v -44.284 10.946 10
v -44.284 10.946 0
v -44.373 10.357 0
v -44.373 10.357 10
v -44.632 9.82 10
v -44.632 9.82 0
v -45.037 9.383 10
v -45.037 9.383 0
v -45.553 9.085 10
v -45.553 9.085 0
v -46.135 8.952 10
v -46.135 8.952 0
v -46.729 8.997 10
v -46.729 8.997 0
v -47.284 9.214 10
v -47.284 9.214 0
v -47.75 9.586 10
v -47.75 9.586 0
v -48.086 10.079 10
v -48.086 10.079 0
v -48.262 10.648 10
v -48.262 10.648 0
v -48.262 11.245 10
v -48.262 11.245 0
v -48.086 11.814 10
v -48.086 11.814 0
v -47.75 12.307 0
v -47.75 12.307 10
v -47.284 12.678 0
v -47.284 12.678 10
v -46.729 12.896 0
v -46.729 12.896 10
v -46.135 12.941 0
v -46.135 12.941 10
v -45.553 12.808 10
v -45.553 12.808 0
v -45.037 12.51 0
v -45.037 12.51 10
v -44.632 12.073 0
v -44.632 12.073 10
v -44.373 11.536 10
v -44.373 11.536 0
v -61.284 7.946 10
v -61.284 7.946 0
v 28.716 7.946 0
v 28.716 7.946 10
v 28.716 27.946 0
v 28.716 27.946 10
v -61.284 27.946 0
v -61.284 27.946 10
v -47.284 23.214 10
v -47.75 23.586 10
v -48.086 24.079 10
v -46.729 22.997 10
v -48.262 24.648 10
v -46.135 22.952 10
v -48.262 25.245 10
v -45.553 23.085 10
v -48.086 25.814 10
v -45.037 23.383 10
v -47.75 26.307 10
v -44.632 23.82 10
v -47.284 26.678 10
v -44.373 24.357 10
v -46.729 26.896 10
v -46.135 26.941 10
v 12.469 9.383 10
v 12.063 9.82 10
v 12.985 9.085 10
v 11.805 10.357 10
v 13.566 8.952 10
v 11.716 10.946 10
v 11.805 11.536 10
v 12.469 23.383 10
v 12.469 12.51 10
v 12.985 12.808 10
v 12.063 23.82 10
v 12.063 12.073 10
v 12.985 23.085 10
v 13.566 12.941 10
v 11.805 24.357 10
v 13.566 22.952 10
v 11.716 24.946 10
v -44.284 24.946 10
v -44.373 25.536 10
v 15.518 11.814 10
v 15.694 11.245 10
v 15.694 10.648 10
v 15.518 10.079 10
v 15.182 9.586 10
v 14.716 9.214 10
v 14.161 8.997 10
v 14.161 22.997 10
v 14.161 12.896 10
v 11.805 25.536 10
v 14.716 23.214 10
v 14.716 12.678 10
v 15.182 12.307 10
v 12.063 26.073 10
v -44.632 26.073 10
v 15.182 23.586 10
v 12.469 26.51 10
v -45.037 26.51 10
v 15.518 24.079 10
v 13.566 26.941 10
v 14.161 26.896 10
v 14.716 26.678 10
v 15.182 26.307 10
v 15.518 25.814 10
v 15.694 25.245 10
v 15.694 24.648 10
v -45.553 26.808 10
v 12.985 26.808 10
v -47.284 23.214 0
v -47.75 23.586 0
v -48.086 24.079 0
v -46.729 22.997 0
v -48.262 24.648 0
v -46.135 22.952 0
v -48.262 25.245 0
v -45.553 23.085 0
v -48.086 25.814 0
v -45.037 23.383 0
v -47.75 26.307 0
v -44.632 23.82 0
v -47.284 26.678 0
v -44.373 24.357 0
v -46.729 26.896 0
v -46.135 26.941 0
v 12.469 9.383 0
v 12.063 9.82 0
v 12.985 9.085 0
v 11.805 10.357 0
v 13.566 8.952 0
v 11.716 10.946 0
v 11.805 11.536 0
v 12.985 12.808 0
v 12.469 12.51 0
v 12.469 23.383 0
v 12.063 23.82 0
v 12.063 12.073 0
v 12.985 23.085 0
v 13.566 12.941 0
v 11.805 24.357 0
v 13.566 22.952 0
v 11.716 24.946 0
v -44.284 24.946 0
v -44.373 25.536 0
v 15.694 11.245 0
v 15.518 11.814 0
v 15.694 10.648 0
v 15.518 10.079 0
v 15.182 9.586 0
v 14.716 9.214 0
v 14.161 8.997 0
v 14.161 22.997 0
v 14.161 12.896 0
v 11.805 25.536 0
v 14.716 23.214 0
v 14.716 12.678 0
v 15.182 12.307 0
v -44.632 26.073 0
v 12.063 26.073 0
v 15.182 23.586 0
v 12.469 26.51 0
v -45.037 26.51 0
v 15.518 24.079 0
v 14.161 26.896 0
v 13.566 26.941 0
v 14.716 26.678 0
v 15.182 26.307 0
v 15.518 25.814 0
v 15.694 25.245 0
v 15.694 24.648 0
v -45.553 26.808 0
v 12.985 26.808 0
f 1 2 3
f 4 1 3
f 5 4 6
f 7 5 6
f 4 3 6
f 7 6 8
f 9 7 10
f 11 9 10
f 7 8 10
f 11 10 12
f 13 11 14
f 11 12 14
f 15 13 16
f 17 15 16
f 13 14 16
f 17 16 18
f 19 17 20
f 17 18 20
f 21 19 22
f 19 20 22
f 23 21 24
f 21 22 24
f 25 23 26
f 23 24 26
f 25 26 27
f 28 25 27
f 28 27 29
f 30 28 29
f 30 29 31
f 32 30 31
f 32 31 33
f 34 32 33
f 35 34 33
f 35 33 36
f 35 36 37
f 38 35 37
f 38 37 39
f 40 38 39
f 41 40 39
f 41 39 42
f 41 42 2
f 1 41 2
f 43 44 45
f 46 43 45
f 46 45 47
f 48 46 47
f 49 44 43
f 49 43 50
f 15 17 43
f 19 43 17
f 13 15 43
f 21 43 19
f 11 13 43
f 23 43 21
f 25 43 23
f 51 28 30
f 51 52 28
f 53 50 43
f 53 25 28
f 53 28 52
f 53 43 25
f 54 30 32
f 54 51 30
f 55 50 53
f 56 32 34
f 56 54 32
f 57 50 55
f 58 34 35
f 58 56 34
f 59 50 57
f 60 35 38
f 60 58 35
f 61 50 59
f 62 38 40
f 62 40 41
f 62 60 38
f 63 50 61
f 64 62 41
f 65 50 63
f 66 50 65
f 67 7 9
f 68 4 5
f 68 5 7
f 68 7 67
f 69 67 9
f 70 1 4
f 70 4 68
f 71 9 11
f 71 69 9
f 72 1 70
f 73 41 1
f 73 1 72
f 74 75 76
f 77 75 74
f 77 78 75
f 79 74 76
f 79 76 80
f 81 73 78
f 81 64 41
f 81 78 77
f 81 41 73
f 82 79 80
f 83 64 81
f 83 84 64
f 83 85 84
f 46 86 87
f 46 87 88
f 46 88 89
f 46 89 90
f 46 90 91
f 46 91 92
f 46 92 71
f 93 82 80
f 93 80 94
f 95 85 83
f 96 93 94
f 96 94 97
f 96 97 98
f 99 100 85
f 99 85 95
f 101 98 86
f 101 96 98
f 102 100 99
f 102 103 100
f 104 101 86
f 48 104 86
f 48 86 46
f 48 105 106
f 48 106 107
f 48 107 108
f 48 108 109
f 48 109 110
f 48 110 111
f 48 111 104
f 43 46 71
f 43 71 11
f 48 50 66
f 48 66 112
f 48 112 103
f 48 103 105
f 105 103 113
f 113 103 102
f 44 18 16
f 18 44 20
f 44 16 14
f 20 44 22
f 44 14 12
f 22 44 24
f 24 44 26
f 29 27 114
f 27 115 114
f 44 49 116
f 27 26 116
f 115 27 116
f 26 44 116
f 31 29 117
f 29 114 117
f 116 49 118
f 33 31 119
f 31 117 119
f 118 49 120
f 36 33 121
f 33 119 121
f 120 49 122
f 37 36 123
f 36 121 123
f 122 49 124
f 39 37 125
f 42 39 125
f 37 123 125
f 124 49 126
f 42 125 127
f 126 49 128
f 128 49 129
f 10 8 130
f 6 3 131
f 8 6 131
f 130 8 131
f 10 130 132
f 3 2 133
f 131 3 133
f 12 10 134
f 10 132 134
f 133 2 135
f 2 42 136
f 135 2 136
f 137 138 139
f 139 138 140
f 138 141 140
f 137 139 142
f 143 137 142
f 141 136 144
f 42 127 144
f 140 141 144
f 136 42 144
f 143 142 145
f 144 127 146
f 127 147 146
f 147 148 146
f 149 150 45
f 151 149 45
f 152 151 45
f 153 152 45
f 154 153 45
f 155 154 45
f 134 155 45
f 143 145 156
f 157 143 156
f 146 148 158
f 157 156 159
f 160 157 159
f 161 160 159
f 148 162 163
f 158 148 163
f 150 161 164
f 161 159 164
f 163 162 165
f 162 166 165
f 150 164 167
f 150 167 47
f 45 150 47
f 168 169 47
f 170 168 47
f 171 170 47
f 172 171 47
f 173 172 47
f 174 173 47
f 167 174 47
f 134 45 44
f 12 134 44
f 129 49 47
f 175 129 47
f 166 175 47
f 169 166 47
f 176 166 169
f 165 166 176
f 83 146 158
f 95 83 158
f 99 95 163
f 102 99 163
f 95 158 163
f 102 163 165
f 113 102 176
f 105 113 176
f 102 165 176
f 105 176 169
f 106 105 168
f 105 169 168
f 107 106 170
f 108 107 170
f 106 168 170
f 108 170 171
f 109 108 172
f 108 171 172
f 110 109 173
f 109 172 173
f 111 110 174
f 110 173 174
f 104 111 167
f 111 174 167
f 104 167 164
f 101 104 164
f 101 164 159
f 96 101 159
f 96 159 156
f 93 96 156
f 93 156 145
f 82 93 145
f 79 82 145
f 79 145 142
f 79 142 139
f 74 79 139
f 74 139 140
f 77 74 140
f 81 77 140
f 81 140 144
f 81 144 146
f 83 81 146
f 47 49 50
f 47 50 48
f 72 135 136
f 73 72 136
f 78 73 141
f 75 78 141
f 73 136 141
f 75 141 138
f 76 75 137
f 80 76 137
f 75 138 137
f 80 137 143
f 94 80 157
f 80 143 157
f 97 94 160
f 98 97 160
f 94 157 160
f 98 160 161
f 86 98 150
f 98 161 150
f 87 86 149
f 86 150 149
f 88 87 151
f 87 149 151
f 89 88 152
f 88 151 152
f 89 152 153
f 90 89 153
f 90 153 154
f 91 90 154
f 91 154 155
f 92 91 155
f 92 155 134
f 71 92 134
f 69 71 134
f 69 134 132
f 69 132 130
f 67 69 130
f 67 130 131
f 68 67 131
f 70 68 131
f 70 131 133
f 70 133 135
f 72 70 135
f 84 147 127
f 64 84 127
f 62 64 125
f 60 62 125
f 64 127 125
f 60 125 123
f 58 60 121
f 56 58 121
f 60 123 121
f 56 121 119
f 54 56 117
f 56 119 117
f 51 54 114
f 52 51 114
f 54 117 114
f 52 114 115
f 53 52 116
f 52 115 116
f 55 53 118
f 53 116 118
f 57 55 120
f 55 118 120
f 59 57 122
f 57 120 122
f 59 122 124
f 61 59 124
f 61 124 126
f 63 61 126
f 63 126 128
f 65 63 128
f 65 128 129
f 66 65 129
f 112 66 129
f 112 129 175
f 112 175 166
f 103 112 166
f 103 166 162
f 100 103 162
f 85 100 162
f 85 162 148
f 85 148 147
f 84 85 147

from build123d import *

# Parameters (mm, degrees)
ESQUISSE1_W             = 90
ESQUISSE1_H             = 20
BOSS_EXTRU_1_DEPTH      = 10
ESQUISSE2_R             = 2
ENL_V_MAT_EXTRU_2_DEPTH = 94


with BuildPart() as part:
    # Esquisse1 → Boss.-Extru.1 (new body)
    with BuildSketch(Plane.XY):
        with Locations((-16.284157465, 17.946446701)):
            Rectangle(ESQUISSE1_W, ESQUISSE1_H)
    extrude(amount=BOSS_EXTRU_1_DEPTH)

    # Esquisse2 → Enlèv. mat.-Extru.2 (cut)
    with BuildSketch(Plane(origin=(0, 0, 0), x_dir=(-1, 0, 0), z_dir=(0, 0, -1))):
        with Locations((-13.715842535, 24.946446701)):
            Circle(ESQUISSE2_R)
        with Locations((-13.715842535, 10.946446701)):
            Circle(ESQUISSE2_R)
        with Locations(Location((46.284157465, 10.946446701, 0), (0, 0, 180))):
            Circle(ESQUISSE2_R)
        with Locations(Location((46.284157465, 24.946446701, 0), (0, 0, 180))):
            Circle(ESQUISSE2_R)
    extrude(amount=-ENL_V_MAT_EXTRU_2_DEPTH, mode=Mode.SUBTRACT)


solid = part.part
